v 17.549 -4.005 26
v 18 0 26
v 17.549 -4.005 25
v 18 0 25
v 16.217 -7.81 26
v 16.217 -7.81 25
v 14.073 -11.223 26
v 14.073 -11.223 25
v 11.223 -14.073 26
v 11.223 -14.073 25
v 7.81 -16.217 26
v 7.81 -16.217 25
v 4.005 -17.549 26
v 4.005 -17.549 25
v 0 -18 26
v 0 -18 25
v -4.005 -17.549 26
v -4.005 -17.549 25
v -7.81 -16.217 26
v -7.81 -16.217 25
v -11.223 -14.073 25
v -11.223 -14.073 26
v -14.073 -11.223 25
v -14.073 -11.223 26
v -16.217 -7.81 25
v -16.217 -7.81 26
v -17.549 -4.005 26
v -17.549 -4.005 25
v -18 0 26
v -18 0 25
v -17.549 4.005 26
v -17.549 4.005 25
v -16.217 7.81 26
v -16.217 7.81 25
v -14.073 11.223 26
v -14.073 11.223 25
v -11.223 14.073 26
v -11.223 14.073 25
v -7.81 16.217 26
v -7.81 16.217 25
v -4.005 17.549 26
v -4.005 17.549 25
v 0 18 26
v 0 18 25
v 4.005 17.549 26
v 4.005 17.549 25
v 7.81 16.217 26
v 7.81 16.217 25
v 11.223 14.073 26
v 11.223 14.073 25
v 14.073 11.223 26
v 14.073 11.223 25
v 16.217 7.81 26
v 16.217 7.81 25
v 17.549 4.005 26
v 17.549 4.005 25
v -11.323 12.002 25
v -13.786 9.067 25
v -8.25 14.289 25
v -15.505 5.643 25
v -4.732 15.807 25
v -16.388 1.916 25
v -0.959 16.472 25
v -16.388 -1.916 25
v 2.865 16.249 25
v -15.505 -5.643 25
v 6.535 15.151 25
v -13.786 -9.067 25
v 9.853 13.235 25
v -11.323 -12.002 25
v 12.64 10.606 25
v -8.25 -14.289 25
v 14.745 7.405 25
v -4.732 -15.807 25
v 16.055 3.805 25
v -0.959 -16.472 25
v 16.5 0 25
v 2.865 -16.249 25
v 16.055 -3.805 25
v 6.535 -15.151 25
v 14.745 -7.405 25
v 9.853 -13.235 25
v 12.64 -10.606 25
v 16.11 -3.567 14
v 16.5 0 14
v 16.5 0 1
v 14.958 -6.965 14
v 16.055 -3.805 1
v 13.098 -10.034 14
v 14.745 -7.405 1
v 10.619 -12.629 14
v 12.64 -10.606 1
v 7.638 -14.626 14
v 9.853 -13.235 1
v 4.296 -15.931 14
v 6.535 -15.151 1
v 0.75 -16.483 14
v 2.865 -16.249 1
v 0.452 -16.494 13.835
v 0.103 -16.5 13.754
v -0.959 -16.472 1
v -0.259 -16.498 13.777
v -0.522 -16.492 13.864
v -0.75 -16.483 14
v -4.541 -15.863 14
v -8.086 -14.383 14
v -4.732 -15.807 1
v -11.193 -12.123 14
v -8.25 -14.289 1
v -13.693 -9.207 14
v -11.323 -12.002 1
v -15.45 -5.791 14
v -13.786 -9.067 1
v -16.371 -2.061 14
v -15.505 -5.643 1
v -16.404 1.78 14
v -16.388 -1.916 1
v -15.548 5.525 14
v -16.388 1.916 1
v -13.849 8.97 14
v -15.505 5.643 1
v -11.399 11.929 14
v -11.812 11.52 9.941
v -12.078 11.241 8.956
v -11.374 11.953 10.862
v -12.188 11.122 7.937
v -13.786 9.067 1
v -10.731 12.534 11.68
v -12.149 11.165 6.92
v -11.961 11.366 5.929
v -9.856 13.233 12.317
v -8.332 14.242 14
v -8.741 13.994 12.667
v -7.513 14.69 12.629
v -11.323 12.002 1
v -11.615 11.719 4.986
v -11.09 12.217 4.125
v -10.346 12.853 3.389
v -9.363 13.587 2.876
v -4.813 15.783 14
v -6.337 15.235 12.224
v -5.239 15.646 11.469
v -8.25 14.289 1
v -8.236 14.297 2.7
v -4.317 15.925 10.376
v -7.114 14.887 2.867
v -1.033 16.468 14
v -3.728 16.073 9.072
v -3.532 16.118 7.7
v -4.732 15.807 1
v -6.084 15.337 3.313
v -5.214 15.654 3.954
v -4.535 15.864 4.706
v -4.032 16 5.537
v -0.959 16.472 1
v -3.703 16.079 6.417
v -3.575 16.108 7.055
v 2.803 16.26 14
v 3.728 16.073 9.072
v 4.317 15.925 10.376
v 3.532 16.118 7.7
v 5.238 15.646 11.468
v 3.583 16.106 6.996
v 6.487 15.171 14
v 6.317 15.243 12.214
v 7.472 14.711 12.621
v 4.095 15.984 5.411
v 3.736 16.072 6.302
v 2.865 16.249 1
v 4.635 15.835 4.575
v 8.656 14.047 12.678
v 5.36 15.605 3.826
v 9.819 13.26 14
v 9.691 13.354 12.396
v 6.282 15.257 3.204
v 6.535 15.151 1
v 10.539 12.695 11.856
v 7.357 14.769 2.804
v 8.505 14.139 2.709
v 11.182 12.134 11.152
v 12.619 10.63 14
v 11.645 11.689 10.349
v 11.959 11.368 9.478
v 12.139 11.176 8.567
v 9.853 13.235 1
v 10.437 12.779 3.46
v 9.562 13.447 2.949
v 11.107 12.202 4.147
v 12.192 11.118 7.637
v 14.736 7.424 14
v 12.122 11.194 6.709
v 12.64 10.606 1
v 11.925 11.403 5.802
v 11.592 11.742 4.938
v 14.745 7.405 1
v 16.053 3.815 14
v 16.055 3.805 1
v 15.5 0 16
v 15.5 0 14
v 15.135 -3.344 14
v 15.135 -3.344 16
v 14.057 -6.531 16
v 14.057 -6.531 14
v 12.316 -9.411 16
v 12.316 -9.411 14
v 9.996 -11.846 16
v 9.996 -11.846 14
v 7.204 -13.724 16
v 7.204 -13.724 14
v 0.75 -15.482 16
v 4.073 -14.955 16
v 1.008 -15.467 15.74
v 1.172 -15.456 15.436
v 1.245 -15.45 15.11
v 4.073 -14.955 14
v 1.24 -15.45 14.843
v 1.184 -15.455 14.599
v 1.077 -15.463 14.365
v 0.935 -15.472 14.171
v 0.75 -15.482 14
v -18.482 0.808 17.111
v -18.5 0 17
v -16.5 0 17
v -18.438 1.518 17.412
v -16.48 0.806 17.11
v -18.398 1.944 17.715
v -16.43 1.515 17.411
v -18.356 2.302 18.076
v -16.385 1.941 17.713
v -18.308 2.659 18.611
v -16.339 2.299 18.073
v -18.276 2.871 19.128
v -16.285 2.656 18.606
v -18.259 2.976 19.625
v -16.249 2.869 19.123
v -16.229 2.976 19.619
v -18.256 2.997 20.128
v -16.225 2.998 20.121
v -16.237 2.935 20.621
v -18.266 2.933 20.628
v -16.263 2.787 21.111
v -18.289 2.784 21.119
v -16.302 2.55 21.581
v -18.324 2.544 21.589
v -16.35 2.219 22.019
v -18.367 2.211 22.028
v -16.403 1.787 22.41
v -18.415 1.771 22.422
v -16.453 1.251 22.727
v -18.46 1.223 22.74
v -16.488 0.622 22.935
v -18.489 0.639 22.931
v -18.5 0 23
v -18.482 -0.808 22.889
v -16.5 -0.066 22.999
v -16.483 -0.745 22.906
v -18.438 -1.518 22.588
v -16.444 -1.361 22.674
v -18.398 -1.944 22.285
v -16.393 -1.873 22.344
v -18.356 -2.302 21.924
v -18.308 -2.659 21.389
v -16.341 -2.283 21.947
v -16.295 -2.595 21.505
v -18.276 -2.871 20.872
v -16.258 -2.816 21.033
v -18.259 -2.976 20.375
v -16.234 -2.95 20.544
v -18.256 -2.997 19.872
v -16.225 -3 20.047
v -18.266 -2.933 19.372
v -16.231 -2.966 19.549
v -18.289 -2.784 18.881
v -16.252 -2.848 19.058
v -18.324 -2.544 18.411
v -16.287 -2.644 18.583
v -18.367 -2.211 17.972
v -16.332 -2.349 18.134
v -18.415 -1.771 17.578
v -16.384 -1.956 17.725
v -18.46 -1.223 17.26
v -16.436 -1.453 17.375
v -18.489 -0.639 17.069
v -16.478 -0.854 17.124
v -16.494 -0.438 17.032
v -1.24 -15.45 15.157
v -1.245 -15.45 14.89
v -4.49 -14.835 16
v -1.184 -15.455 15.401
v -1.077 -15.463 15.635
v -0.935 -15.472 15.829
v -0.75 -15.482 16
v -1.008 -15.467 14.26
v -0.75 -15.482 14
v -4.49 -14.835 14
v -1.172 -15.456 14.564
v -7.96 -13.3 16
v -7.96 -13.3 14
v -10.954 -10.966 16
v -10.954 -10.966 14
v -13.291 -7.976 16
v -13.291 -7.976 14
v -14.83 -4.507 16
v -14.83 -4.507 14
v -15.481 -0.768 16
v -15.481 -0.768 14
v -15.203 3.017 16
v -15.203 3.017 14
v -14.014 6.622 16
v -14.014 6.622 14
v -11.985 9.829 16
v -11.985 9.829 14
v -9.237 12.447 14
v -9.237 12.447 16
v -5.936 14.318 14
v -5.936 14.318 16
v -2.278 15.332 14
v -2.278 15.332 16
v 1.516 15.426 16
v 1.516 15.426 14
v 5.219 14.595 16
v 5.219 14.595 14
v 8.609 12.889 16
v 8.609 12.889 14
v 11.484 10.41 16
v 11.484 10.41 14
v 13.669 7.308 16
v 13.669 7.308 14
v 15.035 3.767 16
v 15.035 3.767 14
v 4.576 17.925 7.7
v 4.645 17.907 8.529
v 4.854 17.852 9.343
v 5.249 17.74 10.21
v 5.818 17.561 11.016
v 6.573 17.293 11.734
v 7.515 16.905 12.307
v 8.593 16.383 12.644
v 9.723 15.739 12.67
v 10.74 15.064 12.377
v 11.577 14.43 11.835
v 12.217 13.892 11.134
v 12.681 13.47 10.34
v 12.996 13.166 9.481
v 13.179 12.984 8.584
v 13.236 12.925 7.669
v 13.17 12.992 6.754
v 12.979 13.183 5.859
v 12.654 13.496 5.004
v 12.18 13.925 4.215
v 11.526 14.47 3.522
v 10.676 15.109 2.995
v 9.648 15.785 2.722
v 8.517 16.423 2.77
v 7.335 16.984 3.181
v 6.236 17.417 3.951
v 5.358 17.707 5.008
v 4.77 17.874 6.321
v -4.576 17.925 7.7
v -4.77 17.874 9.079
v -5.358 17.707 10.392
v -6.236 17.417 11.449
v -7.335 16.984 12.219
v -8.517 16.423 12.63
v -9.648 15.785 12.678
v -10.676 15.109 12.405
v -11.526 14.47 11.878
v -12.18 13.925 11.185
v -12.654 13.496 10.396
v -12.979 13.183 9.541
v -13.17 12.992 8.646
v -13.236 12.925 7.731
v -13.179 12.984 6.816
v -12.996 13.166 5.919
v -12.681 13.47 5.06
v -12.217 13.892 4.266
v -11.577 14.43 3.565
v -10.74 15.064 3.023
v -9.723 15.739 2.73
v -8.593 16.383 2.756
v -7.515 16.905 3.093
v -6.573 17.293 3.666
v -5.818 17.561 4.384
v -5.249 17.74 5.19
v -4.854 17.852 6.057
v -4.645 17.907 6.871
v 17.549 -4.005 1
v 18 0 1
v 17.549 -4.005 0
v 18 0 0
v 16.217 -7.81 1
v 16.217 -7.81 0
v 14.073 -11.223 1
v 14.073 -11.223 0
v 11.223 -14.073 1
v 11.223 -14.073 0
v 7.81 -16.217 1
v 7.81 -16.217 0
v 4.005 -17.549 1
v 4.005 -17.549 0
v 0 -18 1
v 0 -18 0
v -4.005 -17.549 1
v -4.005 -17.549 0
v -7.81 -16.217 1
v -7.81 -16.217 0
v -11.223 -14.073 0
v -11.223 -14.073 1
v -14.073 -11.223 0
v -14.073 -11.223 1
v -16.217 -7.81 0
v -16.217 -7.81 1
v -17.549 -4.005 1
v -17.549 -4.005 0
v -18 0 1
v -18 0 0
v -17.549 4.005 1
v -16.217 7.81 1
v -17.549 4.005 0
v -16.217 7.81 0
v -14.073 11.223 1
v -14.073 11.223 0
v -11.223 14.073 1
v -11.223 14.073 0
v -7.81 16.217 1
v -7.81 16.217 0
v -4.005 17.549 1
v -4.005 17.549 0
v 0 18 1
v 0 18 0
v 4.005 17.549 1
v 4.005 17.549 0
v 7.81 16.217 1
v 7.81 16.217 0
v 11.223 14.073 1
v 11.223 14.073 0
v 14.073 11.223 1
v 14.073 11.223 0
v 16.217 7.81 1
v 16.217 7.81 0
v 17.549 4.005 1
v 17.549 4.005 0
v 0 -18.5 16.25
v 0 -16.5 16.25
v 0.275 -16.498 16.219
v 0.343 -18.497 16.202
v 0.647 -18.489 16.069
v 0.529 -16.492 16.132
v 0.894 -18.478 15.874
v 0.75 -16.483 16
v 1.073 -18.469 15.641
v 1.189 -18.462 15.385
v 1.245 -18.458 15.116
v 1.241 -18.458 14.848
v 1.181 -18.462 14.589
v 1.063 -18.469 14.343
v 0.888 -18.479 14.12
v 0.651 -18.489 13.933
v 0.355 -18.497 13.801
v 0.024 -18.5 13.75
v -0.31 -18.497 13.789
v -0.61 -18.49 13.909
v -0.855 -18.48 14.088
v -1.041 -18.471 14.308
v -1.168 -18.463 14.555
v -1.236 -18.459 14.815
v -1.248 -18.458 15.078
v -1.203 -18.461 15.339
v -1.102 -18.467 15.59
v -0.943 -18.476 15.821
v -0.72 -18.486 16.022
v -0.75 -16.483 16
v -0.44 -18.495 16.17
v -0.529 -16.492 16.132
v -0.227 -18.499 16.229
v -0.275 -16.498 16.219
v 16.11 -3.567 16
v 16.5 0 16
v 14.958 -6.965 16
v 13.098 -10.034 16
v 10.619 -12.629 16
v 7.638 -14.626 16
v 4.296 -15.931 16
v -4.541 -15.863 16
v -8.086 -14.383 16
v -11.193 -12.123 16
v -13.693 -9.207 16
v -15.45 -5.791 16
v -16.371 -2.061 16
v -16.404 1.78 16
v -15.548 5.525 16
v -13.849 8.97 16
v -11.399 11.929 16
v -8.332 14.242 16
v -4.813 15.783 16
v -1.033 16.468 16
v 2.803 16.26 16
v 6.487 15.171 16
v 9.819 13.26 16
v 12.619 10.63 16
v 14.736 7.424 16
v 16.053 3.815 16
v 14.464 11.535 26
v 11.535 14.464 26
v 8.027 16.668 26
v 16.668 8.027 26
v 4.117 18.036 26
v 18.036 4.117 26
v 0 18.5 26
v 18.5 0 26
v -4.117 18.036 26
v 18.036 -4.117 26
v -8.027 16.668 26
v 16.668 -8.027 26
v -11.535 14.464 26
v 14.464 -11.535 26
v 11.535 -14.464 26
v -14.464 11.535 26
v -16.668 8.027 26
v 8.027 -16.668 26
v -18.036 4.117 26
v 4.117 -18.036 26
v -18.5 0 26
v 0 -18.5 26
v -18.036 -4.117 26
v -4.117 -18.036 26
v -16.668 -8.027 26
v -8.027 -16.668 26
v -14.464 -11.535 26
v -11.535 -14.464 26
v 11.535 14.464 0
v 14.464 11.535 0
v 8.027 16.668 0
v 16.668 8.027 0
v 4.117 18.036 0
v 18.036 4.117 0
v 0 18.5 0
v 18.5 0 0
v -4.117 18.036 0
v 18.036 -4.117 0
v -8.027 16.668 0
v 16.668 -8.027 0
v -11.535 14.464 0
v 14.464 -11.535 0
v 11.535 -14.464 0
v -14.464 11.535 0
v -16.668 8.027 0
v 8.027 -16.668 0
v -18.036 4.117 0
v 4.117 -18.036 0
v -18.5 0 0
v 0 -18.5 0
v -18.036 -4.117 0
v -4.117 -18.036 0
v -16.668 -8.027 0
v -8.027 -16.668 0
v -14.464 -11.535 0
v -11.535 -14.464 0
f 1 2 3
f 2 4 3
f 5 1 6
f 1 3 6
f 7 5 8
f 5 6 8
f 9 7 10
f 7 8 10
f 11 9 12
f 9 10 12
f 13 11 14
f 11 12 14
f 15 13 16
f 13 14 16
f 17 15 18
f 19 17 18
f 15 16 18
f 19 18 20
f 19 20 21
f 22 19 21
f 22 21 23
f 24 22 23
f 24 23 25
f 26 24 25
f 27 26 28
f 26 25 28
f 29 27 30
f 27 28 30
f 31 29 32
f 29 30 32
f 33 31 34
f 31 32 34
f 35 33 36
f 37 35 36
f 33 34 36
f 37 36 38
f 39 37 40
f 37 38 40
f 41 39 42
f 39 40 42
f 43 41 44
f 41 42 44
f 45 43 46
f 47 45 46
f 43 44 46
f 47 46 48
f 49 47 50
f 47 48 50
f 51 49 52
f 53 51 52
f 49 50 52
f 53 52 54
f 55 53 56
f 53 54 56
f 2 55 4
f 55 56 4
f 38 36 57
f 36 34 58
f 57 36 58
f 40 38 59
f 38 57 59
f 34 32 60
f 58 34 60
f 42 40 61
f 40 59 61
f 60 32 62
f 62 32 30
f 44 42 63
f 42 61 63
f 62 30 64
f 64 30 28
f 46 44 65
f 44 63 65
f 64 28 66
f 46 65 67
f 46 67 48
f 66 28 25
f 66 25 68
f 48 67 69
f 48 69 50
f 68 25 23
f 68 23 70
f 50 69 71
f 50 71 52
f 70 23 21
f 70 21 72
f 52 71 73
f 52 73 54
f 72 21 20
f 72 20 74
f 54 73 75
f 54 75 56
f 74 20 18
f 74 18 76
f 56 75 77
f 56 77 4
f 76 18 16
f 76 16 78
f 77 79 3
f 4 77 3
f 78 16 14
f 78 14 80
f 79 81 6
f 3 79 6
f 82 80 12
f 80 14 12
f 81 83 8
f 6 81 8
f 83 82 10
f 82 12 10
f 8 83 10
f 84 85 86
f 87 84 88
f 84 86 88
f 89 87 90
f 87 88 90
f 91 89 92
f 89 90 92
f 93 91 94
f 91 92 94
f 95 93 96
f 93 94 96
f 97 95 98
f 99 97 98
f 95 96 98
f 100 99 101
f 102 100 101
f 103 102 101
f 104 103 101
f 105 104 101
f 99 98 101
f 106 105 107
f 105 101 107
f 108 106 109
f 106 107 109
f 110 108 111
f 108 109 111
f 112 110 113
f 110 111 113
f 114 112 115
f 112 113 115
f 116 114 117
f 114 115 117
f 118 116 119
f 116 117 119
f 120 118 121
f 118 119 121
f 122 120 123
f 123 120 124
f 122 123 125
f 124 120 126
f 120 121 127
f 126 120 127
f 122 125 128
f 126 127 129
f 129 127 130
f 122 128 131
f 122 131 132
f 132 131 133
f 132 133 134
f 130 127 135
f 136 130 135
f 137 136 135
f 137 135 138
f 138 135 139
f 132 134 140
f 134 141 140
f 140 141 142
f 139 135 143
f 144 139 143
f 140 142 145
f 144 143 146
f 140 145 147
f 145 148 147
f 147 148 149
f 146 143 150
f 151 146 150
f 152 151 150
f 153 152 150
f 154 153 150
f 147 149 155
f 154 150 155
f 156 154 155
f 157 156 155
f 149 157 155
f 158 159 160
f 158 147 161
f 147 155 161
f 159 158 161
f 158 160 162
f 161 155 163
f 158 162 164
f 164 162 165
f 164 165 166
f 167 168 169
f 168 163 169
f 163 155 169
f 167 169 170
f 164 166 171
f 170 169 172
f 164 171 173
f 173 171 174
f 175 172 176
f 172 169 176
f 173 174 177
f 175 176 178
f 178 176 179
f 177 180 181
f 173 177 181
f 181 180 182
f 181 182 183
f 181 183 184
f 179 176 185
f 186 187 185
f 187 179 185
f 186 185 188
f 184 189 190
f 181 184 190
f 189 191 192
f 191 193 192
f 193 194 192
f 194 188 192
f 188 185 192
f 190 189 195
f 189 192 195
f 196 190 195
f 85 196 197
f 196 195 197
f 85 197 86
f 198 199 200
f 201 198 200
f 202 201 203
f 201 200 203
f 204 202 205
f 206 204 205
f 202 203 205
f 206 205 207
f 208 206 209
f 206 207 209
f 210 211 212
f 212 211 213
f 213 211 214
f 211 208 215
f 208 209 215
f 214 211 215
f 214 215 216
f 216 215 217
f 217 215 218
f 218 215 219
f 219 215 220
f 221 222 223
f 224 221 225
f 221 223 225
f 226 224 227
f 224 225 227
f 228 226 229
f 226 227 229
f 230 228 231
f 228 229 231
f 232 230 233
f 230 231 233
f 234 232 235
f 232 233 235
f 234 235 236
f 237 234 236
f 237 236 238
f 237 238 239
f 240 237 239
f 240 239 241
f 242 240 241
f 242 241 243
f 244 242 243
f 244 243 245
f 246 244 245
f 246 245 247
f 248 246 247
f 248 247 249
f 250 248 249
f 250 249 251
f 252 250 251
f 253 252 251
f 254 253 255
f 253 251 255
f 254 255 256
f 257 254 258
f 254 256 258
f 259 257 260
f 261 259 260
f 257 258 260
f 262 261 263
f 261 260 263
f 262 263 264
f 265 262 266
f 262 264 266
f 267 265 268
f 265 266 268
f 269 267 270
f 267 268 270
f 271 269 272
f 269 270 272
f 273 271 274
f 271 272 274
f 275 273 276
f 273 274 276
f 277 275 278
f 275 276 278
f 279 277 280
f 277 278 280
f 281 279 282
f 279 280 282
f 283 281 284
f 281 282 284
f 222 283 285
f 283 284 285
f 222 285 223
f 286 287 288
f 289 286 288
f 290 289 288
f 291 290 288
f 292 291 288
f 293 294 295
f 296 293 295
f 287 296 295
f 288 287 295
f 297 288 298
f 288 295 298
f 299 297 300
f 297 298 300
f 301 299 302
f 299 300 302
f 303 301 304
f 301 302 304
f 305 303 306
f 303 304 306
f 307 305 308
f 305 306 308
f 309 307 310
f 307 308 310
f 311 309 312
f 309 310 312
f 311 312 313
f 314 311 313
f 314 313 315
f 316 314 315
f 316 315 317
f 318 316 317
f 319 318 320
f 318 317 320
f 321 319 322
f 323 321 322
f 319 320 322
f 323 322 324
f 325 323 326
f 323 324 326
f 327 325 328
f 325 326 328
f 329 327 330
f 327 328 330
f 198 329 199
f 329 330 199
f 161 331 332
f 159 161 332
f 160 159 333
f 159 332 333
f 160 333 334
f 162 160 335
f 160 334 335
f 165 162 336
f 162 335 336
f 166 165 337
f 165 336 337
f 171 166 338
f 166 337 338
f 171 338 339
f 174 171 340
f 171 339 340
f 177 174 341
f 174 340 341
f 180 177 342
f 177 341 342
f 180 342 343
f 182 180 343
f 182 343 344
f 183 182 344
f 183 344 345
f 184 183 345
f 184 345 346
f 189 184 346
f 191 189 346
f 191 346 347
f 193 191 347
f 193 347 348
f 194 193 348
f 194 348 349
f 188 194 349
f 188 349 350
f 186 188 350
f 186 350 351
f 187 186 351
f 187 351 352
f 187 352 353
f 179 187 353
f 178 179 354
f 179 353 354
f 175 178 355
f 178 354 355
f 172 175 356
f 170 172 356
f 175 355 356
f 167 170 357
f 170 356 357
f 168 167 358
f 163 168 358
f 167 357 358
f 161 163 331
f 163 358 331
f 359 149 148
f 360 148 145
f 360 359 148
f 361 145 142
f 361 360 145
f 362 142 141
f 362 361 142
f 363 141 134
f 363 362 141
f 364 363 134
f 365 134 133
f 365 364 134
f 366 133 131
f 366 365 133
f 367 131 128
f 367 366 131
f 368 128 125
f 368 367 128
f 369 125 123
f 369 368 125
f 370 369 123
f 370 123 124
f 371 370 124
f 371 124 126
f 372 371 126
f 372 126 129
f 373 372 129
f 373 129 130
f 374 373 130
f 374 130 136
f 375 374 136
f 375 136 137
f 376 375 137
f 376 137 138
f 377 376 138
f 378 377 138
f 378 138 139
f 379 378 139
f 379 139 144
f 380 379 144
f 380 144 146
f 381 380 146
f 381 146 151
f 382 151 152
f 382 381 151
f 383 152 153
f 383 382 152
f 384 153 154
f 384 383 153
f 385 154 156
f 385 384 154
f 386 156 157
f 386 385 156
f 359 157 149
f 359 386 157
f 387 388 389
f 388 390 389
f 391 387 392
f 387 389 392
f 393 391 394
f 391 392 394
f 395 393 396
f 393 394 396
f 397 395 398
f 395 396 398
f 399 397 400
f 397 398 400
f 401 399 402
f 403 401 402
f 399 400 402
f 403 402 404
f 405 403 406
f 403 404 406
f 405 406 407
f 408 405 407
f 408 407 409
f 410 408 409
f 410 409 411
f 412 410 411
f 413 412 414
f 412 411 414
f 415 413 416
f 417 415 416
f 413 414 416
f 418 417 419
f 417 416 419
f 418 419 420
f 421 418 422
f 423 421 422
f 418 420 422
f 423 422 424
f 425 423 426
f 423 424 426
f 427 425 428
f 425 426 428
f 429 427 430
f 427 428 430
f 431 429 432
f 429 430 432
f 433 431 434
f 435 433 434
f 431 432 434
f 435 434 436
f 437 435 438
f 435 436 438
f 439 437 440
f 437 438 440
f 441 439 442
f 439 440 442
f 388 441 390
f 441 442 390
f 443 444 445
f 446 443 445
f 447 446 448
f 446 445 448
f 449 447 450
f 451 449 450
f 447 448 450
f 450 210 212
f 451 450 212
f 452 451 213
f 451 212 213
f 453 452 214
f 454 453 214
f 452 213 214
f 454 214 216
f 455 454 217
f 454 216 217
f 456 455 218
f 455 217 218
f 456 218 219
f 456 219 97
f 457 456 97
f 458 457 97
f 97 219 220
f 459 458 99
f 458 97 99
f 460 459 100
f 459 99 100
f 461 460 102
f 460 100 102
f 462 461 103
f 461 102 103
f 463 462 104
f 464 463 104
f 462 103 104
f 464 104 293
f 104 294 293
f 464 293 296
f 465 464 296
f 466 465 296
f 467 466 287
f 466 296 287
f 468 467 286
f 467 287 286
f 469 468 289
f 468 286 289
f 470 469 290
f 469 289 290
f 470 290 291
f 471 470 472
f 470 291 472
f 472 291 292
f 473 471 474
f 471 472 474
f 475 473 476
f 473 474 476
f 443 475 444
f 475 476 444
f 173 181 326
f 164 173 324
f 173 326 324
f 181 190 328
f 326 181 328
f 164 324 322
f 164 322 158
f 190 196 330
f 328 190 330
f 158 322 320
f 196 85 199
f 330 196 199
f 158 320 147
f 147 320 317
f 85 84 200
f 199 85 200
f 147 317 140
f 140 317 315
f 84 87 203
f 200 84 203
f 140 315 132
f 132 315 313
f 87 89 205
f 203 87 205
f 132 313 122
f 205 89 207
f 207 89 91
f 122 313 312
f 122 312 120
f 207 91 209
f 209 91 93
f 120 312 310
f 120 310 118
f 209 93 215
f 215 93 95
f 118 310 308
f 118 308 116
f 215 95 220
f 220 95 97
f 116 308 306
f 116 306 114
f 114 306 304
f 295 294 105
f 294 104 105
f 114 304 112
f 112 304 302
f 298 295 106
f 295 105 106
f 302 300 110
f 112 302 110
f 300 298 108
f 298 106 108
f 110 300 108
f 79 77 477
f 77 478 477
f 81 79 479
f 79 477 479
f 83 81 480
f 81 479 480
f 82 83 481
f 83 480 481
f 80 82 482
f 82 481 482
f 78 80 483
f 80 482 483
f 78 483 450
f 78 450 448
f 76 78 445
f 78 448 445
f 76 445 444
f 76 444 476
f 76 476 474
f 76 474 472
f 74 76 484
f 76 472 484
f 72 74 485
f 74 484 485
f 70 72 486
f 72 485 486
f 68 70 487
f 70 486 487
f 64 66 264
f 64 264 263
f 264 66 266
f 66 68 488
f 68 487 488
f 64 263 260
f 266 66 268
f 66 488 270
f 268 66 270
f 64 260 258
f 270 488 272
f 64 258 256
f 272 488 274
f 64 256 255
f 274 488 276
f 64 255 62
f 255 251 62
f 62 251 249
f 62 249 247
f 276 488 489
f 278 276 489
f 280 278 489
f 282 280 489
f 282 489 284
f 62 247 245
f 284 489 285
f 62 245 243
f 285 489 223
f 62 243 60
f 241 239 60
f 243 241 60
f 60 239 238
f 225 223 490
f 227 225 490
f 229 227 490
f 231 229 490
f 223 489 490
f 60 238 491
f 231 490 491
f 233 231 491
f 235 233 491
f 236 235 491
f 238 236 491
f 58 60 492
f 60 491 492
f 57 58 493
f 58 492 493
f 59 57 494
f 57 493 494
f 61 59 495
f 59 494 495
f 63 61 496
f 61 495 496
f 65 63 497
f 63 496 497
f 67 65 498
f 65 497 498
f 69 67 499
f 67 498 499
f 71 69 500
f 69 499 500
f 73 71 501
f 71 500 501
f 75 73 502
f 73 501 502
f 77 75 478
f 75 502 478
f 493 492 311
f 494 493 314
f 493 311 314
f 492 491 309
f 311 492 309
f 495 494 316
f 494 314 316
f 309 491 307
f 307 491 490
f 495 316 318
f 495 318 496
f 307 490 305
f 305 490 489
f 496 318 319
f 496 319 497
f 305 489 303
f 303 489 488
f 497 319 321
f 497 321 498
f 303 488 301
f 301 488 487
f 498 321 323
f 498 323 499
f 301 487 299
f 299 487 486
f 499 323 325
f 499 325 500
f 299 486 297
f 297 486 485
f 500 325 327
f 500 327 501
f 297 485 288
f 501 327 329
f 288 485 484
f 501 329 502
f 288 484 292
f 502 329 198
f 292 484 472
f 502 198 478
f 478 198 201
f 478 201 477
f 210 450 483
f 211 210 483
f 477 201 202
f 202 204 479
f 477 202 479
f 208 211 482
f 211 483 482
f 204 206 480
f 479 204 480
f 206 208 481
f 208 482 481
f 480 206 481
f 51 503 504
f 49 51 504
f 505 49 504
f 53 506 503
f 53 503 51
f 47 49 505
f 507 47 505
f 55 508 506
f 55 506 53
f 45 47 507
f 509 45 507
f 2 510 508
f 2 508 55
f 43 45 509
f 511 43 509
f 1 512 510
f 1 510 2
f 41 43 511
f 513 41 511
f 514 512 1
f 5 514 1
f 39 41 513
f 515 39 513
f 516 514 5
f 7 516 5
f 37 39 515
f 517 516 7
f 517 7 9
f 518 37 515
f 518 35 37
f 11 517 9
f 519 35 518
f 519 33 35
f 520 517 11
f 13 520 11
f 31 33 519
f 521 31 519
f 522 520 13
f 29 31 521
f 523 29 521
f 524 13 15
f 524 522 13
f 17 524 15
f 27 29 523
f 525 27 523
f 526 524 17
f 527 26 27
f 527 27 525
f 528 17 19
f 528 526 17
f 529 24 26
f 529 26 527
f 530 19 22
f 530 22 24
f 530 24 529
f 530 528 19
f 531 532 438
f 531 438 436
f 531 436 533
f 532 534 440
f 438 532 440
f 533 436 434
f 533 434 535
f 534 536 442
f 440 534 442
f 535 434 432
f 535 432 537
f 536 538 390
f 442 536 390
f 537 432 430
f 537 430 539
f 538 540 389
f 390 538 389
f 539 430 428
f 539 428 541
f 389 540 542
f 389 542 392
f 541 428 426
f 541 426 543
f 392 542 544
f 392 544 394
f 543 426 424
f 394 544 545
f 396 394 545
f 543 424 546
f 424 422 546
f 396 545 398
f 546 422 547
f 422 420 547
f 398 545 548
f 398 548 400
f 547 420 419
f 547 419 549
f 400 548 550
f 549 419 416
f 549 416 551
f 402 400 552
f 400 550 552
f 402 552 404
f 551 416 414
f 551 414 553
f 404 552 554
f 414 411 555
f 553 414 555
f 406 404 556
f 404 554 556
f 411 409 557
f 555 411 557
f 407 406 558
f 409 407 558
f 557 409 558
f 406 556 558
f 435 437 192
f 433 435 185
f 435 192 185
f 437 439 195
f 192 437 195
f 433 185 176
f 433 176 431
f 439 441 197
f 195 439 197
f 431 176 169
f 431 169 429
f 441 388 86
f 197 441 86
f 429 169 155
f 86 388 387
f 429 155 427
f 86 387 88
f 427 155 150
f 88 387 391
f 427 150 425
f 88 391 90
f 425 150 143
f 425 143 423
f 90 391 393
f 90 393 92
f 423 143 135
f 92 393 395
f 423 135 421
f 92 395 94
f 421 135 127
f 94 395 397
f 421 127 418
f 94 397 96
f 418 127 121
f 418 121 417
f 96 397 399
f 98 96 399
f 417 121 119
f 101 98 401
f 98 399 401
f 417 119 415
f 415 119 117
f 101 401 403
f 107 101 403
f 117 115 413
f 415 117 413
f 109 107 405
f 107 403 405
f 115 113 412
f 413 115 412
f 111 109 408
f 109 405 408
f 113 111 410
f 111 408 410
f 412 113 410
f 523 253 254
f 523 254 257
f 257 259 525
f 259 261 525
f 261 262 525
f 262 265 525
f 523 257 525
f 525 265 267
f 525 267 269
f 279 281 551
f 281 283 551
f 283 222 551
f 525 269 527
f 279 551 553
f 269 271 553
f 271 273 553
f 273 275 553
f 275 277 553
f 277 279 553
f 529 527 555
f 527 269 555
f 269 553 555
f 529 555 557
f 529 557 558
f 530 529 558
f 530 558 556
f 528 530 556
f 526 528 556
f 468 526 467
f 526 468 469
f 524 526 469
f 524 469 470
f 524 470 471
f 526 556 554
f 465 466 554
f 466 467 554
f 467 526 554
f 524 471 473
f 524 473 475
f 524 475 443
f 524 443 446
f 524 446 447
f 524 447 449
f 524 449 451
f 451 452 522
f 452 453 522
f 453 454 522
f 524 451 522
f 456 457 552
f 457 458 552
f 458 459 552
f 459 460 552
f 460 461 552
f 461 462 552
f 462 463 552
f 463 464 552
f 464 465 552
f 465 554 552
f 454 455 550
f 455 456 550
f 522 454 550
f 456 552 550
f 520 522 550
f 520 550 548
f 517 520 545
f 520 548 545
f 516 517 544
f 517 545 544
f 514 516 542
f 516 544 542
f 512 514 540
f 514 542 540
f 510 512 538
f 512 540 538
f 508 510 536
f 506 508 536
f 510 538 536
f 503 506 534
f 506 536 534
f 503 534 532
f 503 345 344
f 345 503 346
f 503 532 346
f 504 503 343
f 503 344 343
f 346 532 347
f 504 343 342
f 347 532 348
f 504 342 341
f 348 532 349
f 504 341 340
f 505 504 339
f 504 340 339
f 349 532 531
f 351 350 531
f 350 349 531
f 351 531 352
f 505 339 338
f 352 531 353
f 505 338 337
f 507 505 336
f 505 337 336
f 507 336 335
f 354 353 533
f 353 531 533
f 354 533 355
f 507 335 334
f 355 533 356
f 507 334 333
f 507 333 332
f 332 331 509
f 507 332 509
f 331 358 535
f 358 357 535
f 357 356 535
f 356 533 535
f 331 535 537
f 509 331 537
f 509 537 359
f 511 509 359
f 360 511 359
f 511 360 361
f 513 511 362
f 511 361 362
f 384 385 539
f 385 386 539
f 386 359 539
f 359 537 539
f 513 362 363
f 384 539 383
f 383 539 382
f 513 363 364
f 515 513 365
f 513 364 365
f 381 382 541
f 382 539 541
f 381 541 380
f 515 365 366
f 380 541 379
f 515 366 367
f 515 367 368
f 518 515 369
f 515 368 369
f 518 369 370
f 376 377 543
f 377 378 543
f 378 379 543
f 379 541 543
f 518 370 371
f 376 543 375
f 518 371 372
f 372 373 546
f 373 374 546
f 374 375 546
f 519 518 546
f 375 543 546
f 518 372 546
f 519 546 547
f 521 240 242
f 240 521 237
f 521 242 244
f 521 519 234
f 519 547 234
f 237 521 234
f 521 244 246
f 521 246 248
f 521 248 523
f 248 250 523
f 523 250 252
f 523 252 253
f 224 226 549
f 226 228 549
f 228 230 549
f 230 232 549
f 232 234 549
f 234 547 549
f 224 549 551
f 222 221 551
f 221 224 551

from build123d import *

# Parameters (mm, degrees)
SKETCH1_R           = 19
SKETCH1_R_2         = 13.5
BOSS_EXTRUDE1_DEPTH = 26
SKETCH2_W           = 26
SKETCH2_H           = 0.5
SKETCH4_R           = 5
CUT_EXTRUDE1_DEPTH  = 10
SKETCH5_R           = 1.25
CUT_EXTRUDE4_DEPTH  = 20
SKETCH6_R           = 3
CUT_EXTRUDE5_DEPTH  = 20


with BuildPart() as part:
    # Sketch1 → Boss-Extrude1 (new body)
    with BuildSketch(Plane.XY):
        with Locations(Location((0, 0, 0), (0, 0, 180))):
            Circle(SKETCH1_R)
        with Locations(Location((0, 0, 0), (0, 0, 180))):
            Circle(SKETCH1_R_2, mode=Mode.SUBTRACT)
    extrude(amount=BOSS_EXTRUDE1_DEPTH)

    # Sketch2 → Cut-Revolve1 (revolve, cut)
    with BuildSketch(Plane(origin=(0, 0, 0), x_dir=(0, 0, -1), z_dir=(1, 0, 0)), mode=Mode.PRIVATE) as cut_revolve1_sk:
        with Locations((-13, 18.75)):
            Rectangle(SKETCH2_W, SKETCH2_H)
    revolve(cut_revolve1_sk.sketch.rotate(Axis((0, 0, 0), (0, 0, 1)), 90), axis=Axis((0, 0, 0), (0, 0, 1)), mode=Mode.SUBTRACT)

    # Sketch3 → Cut-Revolve2 (revolve, cut)
    with BuildSketch(Plane(origin=(0, 0, 0), x_dir=(0, 0, -1), z_dir=(1, 0, 0)), mode=Mode.PRIVATE) as cut_revolve2_sk:
        Polygon((0, 18), (0, 0), (-26, 0), (-26, 18), (-25, 18), (-25, 16.5), (-16, 16.5), (-16, 15.5), (-14, 15.5), (-14, 16.5), (-1, 16.5), (-1, 18), align=None)
    revolve(cut_revolve2_sk.sketch.rotate(Axis((0, 0, 26), (0, 0, -1)), 90), axis=Axis((0, 0, 26), (0, 0, -1)), mode=Mode.SUBTRACT)

    # Sketch4 → Cut-Extrude1 (cut)
    with BuildSketch(Plane(origin=(9.25, 16.02146997, 0), x_dir=(-0.866025403784438, 0.500000000000001, 0), z_dir=(0.500000000000001, 0.866025403784438, 0))):
        with Locations((0, 7.7)):
            Circle(SKETCH4_R)
    cut_extrude1 = extrude(amount=-CUT_EXTRUDE1_DEPTH, mode=Mode.SUBTRACT)

    # Mirror1: Cut-Extrude1 across plane
    add(cut_extrude1.mirror(Plane(origin=(0, 0, 0), x_dir=(0, 0, 1), z_dir=(1, 0, 0))), mode=Mode.SUBTRACT)

    # Sketch5 → Cut-Extrude4 (cut)
    with BuildSketch(Plane(origin=(0, 0, 0), x_dir=(1, 0, 0), z_dir=(0, 1, 0))):
        with Locations(Location((0, -15, 0), (0, 0, 270))):
            Circle(SKETCH5_R)
    extrude(amount=-CUT_EXTRUDE4_DEPTH, mode=Mode.SUBTRACT)

    # Sketch6 → Cut-Extrude5 (cut)
    with BuildSketch(Plane(origin=(0, 0, 0), x_dir=(0, 0, -1), z_dir=(1, 0, 0))):
        with Locations((-20, 0)):
            Circle(SKETCH6_R)
    extrude(amount=-CUT_EXTRUDE5_DEPTH, mode=Mode.SUBTRACT)


solid = part.part
